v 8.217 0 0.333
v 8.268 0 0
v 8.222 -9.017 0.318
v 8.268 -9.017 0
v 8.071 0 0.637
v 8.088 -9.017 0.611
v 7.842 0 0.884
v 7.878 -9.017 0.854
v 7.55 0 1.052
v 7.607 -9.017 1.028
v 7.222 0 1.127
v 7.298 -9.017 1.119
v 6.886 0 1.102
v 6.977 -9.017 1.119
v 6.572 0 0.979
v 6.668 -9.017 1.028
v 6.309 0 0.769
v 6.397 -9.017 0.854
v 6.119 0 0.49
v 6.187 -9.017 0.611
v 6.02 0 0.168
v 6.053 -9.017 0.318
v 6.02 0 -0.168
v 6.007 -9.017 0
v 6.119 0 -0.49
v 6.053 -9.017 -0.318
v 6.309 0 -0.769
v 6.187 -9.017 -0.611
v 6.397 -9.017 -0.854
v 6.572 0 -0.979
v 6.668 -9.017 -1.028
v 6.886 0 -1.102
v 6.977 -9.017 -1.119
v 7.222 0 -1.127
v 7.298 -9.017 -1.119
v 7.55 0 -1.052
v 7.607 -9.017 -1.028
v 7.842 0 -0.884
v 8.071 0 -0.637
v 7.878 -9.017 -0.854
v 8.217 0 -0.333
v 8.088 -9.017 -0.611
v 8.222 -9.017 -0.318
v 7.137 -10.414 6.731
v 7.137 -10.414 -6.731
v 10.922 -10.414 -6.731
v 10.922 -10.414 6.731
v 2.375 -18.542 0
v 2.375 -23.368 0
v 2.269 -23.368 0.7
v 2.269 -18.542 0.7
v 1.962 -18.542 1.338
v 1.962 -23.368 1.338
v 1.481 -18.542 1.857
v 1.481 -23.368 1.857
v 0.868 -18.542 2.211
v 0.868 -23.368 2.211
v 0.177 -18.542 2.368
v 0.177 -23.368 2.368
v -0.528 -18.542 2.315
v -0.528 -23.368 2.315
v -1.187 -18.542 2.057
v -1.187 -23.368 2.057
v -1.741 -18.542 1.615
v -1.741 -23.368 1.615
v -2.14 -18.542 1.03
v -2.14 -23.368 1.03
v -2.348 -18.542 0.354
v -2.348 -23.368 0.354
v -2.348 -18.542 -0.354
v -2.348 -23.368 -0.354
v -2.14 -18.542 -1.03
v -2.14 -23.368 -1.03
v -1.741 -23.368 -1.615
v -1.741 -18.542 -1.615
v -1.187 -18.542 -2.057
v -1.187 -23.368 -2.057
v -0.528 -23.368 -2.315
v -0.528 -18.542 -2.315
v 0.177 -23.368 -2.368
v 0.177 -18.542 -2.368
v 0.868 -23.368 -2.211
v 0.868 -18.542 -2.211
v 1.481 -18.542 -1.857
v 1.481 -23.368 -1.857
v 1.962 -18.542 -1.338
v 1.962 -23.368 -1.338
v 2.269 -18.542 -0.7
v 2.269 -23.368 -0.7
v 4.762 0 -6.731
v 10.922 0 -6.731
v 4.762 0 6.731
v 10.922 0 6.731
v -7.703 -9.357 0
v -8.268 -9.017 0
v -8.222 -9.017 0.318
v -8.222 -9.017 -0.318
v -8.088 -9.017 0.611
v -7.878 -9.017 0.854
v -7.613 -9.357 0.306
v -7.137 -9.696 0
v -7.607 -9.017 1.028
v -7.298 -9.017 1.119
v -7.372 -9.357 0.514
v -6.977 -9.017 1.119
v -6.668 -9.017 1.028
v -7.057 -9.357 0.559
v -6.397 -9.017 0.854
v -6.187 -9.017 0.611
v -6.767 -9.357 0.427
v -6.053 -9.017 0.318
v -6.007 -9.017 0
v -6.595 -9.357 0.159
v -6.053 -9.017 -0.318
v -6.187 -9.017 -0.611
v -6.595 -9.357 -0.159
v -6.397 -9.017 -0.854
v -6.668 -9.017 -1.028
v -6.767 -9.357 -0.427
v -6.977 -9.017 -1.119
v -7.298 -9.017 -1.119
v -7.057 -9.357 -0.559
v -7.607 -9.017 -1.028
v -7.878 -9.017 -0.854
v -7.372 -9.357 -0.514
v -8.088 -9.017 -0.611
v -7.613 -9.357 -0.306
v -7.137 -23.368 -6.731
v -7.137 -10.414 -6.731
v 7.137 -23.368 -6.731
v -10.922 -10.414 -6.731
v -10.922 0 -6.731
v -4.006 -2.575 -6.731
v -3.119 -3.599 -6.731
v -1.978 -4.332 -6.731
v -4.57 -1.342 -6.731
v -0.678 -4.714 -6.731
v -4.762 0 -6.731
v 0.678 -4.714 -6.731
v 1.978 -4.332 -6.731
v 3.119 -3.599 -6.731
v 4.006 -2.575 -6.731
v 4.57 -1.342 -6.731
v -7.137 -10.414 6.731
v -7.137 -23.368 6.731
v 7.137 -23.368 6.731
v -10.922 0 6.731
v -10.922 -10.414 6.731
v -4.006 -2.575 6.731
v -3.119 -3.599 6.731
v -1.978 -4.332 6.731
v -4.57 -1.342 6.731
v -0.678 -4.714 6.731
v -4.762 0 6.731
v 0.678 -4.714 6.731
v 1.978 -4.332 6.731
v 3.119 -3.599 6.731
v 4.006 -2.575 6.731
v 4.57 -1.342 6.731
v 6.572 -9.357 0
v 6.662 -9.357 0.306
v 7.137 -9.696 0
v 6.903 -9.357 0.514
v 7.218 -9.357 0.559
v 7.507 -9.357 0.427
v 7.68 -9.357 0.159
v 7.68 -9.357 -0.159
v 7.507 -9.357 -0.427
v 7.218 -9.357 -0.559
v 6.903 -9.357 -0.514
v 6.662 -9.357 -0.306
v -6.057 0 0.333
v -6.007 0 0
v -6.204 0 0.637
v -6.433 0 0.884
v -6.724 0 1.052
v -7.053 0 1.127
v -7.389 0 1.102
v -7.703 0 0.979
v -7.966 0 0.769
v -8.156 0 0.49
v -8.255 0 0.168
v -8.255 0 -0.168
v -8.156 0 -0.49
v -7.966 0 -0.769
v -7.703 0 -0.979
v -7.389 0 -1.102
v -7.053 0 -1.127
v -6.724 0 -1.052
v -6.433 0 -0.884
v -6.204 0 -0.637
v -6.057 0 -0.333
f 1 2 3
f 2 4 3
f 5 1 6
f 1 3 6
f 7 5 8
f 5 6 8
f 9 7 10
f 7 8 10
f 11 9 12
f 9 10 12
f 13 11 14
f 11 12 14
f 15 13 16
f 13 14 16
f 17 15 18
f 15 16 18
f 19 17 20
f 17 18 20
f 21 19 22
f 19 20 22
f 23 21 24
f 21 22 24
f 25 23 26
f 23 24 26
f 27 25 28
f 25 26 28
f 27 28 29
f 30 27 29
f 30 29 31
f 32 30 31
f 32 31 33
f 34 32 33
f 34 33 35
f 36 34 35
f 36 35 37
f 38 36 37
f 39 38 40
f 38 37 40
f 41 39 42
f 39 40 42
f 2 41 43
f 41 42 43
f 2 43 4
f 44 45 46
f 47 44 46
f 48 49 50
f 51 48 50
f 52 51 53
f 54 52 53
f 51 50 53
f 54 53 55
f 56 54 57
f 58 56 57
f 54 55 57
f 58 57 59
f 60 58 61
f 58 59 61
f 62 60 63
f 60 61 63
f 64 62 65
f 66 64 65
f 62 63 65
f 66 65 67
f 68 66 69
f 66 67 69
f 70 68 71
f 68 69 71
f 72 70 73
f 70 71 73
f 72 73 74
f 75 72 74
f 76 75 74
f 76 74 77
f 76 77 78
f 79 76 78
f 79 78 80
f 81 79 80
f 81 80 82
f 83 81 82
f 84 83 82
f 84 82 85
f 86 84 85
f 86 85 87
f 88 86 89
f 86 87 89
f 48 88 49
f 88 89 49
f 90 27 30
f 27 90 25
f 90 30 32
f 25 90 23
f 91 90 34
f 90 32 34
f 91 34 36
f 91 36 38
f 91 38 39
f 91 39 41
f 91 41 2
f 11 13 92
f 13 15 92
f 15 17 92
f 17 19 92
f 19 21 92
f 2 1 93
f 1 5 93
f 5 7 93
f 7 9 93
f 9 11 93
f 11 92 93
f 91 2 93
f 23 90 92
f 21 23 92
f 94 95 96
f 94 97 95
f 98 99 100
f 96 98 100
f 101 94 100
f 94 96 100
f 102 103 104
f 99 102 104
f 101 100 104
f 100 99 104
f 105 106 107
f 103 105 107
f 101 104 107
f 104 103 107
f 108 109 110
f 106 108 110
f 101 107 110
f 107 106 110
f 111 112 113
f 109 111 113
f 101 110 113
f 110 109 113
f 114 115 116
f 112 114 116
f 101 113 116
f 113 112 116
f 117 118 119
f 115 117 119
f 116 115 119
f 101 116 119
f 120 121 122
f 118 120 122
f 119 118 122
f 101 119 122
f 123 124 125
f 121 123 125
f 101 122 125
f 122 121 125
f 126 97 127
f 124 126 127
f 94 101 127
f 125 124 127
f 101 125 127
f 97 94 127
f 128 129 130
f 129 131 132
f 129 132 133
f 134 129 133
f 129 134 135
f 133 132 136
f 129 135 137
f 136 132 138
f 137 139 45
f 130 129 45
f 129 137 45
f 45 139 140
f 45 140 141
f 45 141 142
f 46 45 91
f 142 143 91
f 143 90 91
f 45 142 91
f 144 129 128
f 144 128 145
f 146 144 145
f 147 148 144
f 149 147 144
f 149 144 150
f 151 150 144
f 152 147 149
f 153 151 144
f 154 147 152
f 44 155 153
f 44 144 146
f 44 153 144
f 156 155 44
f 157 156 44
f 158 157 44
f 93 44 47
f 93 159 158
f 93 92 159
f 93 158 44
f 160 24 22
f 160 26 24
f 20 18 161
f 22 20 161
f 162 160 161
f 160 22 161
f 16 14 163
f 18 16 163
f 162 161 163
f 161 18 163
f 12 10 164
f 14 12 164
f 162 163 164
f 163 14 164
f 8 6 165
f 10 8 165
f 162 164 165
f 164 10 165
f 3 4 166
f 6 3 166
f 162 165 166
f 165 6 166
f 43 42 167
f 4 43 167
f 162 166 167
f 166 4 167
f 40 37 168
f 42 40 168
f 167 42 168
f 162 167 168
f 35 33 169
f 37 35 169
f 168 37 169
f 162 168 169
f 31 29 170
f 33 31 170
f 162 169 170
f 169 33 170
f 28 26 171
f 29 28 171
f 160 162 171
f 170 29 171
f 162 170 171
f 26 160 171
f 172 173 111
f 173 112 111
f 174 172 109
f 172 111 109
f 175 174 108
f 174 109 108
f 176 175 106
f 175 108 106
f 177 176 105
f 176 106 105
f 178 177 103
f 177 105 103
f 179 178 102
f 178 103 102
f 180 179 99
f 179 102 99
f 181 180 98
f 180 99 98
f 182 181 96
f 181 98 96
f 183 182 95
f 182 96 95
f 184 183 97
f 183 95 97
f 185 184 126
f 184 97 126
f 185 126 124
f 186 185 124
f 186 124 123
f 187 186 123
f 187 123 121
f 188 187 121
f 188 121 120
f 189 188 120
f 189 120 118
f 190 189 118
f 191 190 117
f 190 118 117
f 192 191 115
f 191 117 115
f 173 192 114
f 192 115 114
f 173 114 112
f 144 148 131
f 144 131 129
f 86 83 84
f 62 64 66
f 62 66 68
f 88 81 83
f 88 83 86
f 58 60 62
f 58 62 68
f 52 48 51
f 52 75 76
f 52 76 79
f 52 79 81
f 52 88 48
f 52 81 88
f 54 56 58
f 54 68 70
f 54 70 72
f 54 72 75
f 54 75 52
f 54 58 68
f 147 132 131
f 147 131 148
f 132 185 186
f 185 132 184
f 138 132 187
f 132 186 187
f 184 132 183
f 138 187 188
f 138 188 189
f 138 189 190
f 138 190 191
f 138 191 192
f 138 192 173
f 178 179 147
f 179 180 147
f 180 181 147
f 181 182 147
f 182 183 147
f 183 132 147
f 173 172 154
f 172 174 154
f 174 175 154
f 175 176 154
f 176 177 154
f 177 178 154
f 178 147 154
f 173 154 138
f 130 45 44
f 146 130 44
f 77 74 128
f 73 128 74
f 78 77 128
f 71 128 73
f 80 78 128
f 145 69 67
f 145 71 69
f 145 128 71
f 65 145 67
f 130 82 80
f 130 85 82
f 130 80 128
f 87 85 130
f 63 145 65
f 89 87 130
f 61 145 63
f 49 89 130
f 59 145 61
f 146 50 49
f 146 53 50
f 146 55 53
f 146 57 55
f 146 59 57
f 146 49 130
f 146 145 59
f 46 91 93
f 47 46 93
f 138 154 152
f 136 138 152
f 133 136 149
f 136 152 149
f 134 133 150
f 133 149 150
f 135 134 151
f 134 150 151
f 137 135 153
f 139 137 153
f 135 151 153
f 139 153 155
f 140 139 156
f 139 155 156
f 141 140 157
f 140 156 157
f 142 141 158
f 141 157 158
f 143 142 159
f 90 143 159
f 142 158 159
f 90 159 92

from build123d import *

# Parameters (mm, degrees)
F0_W     = 21.844
F0_H     = 13.462
F1_DEPTH = 10.414
F2_W     = 14.2748
F2_H     = 13.462
F3_DEPTH = 12.954
F4_R     = 2.3749
F5_DEPTH = 4.826
F7_D     = 2.2606
F7_DEPTH = 9.017
F7_TIP   = 0.6791527577
F9_DEPTH = 13.463


with BuildPart() as f1:
    # F0 (on Front) → F1 (new body)
    with BuildSketch(Plane.XZ):
        Rectangle(F0_W, F0_H)
    extrude(amount=F1_DEPTH)

    # F2 (on face) → F3 (join)
    with BuildSketch(Plane.XZ.offset(10.414)):
        Rectangle(F2_W, F2_H)
    extrude(amount=F3_DEPTH)

    # F4 (on face) → F5 (cut)
    with BuildSketch(Plane.XZ.offset(23.368)):
        Circle(F4_R)
    extrude(amount=-F5_DEPTH, mode=Mode.SUBTRACT)

    # F7
    with Locations(Plane(origin=(0, 0, 0), x_dir=(-1, 0, 0), z_dir=(0, 1, 0))):
        with Locations((7.1374, 0), (-7.1374, 0)):
            Hole(F7_D / 2, depth=F7_DEPTH)
            with Locations((0, 0, -(F7_DEPTH + F7_TIP / 2))):  # 118° drill point
                Cone(0, F7_D / 2, F7_TIP, mode=Mode.SUBTRACT)

    # F8 (on face) → F9 (cut, through all)
    with BuildSketch(Plane.XY.offset(6.731)):
        with BuildLine():
            ThreePointArc((-4.7625, 0), (0, -4.7625), (4.7625, 0))
            Line((4.7625, 0), (-4.7625, 0))
        make_face()
    extrude(amount=-F9_DEPTH, mode=Mode.SUBTRACT)


solid = f1.part
